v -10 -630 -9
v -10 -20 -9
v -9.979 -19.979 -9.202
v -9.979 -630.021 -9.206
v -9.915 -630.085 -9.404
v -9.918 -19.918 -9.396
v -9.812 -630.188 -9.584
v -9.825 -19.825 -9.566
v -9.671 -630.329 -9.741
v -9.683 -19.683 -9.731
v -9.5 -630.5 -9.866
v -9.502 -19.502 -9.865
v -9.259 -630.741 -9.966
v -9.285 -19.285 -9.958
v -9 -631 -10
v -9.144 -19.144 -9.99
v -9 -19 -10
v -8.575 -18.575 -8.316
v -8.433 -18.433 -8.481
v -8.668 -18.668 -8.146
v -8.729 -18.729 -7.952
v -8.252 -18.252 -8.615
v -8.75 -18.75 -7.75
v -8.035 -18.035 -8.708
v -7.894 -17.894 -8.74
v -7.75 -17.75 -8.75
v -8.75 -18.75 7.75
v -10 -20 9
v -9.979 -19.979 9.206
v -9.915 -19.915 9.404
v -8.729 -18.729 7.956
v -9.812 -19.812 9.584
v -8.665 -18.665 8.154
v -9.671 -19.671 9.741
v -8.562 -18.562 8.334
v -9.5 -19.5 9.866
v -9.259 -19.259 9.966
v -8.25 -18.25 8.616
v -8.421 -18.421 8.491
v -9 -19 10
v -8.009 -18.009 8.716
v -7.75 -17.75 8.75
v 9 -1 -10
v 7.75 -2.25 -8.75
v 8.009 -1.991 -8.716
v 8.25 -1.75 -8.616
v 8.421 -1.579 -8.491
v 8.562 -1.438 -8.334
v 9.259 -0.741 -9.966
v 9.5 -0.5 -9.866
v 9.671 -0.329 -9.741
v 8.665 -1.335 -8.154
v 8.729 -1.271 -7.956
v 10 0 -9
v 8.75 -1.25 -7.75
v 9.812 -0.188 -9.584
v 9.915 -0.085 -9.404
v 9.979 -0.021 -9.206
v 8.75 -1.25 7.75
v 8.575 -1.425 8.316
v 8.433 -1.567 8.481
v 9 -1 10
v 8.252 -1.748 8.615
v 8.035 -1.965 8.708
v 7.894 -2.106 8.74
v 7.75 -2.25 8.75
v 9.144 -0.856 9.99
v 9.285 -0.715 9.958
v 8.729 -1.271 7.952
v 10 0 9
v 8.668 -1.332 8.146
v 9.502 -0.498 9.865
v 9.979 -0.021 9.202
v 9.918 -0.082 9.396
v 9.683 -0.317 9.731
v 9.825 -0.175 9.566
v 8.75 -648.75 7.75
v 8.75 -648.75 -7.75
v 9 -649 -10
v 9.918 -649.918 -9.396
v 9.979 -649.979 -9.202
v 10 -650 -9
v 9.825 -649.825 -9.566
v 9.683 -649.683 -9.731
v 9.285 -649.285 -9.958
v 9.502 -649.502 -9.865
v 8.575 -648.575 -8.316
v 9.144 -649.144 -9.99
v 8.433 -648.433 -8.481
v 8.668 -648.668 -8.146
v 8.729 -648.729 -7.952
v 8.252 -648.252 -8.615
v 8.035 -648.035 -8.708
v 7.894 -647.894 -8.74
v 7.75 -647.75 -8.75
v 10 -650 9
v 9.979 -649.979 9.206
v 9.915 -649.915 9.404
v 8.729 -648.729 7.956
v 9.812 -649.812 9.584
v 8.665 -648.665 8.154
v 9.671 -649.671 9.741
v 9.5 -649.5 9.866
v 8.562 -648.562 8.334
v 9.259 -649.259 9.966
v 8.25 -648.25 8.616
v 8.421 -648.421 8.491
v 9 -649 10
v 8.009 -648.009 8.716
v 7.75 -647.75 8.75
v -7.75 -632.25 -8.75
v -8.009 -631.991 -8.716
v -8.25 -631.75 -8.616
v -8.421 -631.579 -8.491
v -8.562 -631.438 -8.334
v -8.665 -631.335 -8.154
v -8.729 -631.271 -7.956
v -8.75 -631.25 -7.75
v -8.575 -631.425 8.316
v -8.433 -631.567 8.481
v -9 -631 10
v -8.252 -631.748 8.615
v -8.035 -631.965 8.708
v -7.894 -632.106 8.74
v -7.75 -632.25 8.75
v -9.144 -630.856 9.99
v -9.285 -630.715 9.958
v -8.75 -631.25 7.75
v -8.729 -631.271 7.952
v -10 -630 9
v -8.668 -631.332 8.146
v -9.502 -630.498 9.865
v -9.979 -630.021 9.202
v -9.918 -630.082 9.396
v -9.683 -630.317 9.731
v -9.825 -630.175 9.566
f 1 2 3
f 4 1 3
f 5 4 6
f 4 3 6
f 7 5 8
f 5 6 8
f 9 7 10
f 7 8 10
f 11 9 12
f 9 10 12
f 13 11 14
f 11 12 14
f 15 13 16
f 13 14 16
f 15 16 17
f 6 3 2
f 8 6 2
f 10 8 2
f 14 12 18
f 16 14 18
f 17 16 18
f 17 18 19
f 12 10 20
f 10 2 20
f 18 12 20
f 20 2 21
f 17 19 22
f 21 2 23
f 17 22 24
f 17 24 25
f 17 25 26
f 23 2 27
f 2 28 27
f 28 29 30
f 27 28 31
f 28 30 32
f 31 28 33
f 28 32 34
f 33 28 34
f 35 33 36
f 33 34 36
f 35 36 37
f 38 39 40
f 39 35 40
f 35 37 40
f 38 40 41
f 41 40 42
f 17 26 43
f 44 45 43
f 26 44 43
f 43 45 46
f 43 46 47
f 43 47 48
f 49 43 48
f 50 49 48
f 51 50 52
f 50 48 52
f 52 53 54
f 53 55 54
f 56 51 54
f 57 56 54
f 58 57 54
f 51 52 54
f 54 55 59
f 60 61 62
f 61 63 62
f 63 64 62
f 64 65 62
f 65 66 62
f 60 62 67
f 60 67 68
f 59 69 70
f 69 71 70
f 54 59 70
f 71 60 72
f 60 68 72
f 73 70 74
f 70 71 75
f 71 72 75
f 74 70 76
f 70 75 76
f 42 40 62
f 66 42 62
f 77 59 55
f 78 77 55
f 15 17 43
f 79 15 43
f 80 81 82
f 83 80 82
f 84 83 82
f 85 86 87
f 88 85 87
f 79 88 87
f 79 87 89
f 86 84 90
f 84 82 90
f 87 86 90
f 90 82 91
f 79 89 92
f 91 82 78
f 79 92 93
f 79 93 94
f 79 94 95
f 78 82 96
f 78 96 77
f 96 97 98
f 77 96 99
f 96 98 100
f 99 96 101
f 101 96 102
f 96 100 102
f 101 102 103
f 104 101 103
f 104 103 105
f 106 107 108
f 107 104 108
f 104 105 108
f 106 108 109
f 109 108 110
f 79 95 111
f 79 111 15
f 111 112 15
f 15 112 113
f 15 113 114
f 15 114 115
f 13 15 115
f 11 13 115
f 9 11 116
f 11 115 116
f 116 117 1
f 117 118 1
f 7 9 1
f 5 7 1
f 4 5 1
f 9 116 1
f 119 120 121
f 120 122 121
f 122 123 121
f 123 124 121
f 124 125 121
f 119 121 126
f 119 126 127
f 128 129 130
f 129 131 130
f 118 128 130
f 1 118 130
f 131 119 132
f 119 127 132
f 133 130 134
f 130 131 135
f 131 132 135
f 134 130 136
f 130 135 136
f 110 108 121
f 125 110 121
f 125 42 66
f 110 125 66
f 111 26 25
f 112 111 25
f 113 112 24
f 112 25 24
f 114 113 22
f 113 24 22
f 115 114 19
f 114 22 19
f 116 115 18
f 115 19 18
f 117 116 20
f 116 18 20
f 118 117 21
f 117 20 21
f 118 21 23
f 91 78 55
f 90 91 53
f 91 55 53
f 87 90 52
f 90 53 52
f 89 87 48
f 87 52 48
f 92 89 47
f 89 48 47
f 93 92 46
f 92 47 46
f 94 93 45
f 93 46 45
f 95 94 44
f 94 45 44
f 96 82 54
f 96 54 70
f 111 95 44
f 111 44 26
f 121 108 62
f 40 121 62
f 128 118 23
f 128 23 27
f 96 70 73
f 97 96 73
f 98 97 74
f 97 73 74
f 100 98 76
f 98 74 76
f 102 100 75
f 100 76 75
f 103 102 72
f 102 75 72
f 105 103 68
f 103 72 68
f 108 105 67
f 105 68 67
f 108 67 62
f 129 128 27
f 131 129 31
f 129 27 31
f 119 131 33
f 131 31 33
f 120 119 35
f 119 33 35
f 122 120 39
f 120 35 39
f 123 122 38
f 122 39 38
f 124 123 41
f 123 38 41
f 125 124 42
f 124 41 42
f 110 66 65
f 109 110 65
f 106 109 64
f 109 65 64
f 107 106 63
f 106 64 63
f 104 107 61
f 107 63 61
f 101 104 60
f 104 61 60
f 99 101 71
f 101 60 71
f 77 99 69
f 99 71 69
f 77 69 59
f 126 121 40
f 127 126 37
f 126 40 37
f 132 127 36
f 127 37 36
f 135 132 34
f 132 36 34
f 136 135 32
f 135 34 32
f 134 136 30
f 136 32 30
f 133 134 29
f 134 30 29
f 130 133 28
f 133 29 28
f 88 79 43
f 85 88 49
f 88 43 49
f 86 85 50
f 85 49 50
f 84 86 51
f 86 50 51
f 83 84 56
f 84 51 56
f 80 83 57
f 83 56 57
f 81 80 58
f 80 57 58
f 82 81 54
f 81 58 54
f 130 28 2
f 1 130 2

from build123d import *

# Parameters (mm, degrees)
F1_DEPTH = 650
F3_DEPTH = 20


with BuildPart() as f1:
    # F0 (on Front) → F1 (new body)
    with BuildSketch(Plane.XZ):
        with BuildLine():
            Line((9, 10), (-9, 10))
            ThreePointArc((-9, 10), (-9.707107, 9.707107), (-10, 9))
            Line((-10, 9), (-10, -9))
            ThreePointArc((-10, -9), (-9.707107, -9.707107), (-9, -10))
            Line((-9, -10), (9, -10))
            ThreePointArc((9, -10), (9.707107, -9.707107), (10, -9))
            Line((10, -9), (10, 9))
            ThreePointArc((10, 9), (9.707107, 9.707107), (9, 10))
        make_face()
        with BuildLine():
            ThreePointArc((-8.75, 7.75), (-8.457107, 8.457107), (-7.75, 8.75))
            Line((-7.75, 8.75), (7.75, 8.75))
            ThreePointArc((7.75, 8.75), (8.457107, 8.457107), (8.75, 7.75))
            Line((8.75, 7.75), (8.75, -7.75))
            ThreePointArc((8.75, -7.75), (8.457107, -8.457107), (7.75, -8.75))
            Line((7.75, -8.75), (-7.75, -8.75))
            ThreePointArc((-7.75, -8.75), (-8.457107, -8.457107), (-8.75, -7.75))
            Line((-8.75, -7.75), (-8.75, 7.75))
        make_face(mode=Mode.SUBTRACT)
    extrude(amount=F1_DEPTH)

    # F2 (on face) → F3 (cut)
    with BuildSketch(Plane.XY.offset(10)):
        Polygon((-9, -650), (9, -650), (9, -649), (-9, -631), align=None)
        Polygon((-10, -650), (-9, -650), (-9, -631), (-10, -630), align=None)
        Polygon((9, -649), (9, -650), (10, -650), align=None)
        Polygon((9, 0), (9, -1), (10, 0), align=None)
        Polygon((-9, -19), (9, -1), (9, 0), (-9, 0), align=None)
        Polygon((-10, -20), (-9, -19), (-9, 0), (-10, 0), align=None)
    extrude(amount=-F3_DEPTH, mode=Mode.SUBTRACT)


solid = f1.part
